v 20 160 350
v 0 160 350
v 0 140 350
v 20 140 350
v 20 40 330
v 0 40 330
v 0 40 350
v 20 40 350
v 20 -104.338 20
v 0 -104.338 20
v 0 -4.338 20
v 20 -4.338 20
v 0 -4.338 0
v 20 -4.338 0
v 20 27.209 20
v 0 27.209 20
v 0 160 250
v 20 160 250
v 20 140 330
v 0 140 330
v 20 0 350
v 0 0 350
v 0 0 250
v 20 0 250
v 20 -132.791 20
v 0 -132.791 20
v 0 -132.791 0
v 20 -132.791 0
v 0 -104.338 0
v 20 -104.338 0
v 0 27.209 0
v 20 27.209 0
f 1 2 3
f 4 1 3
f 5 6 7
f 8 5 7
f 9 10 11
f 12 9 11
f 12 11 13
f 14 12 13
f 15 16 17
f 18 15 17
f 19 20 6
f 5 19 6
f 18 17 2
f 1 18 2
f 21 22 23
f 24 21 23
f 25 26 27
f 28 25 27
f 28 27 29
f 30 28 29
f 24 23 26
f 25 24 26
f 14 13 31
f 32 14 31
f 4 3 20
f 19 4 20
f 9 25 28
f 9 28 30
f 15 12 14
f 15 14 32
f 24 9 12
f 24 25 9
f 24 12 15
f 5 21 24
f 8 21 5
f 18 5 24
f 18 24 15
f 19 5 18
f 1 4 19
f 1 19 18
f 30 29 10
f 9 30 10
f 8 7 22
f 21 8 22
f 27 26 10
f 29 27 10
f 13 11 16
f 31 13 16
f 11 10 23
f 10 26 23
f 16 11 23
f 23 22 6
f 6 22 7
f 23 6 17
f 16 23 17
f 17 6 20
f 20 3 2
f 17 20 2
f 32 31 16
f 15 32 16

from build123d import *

# Parameters (mm, degrees)
F1_DEPTH = 20


with BuildPart() as f1:
    # F0 (on Right) → F1 (new body)
    with BuildSketch(Plane.YZ):
        Polygon((-132.7905619136, 20), (-132.7905619136, 0), (-104.3375672974, 0), (-104.3375672974, 20), (-4.3375672974, 20), (-4.3375672974, 0), (15.6624327026, 0), (27.2094380864, 20), (160, 250), (0, 250), align=None)
        Polygon((27.2094380864, 20), (15.6624327026, 0), (27.2094380864, 0), align=None)
        Polygon((0, 350), (0, 250), (160, 250), (160, 350), (140, 350), (140, 330), (40, 330), (40, 350), align=None)
    extrude(amount=F1_DEPTH)


solid = f1.part
